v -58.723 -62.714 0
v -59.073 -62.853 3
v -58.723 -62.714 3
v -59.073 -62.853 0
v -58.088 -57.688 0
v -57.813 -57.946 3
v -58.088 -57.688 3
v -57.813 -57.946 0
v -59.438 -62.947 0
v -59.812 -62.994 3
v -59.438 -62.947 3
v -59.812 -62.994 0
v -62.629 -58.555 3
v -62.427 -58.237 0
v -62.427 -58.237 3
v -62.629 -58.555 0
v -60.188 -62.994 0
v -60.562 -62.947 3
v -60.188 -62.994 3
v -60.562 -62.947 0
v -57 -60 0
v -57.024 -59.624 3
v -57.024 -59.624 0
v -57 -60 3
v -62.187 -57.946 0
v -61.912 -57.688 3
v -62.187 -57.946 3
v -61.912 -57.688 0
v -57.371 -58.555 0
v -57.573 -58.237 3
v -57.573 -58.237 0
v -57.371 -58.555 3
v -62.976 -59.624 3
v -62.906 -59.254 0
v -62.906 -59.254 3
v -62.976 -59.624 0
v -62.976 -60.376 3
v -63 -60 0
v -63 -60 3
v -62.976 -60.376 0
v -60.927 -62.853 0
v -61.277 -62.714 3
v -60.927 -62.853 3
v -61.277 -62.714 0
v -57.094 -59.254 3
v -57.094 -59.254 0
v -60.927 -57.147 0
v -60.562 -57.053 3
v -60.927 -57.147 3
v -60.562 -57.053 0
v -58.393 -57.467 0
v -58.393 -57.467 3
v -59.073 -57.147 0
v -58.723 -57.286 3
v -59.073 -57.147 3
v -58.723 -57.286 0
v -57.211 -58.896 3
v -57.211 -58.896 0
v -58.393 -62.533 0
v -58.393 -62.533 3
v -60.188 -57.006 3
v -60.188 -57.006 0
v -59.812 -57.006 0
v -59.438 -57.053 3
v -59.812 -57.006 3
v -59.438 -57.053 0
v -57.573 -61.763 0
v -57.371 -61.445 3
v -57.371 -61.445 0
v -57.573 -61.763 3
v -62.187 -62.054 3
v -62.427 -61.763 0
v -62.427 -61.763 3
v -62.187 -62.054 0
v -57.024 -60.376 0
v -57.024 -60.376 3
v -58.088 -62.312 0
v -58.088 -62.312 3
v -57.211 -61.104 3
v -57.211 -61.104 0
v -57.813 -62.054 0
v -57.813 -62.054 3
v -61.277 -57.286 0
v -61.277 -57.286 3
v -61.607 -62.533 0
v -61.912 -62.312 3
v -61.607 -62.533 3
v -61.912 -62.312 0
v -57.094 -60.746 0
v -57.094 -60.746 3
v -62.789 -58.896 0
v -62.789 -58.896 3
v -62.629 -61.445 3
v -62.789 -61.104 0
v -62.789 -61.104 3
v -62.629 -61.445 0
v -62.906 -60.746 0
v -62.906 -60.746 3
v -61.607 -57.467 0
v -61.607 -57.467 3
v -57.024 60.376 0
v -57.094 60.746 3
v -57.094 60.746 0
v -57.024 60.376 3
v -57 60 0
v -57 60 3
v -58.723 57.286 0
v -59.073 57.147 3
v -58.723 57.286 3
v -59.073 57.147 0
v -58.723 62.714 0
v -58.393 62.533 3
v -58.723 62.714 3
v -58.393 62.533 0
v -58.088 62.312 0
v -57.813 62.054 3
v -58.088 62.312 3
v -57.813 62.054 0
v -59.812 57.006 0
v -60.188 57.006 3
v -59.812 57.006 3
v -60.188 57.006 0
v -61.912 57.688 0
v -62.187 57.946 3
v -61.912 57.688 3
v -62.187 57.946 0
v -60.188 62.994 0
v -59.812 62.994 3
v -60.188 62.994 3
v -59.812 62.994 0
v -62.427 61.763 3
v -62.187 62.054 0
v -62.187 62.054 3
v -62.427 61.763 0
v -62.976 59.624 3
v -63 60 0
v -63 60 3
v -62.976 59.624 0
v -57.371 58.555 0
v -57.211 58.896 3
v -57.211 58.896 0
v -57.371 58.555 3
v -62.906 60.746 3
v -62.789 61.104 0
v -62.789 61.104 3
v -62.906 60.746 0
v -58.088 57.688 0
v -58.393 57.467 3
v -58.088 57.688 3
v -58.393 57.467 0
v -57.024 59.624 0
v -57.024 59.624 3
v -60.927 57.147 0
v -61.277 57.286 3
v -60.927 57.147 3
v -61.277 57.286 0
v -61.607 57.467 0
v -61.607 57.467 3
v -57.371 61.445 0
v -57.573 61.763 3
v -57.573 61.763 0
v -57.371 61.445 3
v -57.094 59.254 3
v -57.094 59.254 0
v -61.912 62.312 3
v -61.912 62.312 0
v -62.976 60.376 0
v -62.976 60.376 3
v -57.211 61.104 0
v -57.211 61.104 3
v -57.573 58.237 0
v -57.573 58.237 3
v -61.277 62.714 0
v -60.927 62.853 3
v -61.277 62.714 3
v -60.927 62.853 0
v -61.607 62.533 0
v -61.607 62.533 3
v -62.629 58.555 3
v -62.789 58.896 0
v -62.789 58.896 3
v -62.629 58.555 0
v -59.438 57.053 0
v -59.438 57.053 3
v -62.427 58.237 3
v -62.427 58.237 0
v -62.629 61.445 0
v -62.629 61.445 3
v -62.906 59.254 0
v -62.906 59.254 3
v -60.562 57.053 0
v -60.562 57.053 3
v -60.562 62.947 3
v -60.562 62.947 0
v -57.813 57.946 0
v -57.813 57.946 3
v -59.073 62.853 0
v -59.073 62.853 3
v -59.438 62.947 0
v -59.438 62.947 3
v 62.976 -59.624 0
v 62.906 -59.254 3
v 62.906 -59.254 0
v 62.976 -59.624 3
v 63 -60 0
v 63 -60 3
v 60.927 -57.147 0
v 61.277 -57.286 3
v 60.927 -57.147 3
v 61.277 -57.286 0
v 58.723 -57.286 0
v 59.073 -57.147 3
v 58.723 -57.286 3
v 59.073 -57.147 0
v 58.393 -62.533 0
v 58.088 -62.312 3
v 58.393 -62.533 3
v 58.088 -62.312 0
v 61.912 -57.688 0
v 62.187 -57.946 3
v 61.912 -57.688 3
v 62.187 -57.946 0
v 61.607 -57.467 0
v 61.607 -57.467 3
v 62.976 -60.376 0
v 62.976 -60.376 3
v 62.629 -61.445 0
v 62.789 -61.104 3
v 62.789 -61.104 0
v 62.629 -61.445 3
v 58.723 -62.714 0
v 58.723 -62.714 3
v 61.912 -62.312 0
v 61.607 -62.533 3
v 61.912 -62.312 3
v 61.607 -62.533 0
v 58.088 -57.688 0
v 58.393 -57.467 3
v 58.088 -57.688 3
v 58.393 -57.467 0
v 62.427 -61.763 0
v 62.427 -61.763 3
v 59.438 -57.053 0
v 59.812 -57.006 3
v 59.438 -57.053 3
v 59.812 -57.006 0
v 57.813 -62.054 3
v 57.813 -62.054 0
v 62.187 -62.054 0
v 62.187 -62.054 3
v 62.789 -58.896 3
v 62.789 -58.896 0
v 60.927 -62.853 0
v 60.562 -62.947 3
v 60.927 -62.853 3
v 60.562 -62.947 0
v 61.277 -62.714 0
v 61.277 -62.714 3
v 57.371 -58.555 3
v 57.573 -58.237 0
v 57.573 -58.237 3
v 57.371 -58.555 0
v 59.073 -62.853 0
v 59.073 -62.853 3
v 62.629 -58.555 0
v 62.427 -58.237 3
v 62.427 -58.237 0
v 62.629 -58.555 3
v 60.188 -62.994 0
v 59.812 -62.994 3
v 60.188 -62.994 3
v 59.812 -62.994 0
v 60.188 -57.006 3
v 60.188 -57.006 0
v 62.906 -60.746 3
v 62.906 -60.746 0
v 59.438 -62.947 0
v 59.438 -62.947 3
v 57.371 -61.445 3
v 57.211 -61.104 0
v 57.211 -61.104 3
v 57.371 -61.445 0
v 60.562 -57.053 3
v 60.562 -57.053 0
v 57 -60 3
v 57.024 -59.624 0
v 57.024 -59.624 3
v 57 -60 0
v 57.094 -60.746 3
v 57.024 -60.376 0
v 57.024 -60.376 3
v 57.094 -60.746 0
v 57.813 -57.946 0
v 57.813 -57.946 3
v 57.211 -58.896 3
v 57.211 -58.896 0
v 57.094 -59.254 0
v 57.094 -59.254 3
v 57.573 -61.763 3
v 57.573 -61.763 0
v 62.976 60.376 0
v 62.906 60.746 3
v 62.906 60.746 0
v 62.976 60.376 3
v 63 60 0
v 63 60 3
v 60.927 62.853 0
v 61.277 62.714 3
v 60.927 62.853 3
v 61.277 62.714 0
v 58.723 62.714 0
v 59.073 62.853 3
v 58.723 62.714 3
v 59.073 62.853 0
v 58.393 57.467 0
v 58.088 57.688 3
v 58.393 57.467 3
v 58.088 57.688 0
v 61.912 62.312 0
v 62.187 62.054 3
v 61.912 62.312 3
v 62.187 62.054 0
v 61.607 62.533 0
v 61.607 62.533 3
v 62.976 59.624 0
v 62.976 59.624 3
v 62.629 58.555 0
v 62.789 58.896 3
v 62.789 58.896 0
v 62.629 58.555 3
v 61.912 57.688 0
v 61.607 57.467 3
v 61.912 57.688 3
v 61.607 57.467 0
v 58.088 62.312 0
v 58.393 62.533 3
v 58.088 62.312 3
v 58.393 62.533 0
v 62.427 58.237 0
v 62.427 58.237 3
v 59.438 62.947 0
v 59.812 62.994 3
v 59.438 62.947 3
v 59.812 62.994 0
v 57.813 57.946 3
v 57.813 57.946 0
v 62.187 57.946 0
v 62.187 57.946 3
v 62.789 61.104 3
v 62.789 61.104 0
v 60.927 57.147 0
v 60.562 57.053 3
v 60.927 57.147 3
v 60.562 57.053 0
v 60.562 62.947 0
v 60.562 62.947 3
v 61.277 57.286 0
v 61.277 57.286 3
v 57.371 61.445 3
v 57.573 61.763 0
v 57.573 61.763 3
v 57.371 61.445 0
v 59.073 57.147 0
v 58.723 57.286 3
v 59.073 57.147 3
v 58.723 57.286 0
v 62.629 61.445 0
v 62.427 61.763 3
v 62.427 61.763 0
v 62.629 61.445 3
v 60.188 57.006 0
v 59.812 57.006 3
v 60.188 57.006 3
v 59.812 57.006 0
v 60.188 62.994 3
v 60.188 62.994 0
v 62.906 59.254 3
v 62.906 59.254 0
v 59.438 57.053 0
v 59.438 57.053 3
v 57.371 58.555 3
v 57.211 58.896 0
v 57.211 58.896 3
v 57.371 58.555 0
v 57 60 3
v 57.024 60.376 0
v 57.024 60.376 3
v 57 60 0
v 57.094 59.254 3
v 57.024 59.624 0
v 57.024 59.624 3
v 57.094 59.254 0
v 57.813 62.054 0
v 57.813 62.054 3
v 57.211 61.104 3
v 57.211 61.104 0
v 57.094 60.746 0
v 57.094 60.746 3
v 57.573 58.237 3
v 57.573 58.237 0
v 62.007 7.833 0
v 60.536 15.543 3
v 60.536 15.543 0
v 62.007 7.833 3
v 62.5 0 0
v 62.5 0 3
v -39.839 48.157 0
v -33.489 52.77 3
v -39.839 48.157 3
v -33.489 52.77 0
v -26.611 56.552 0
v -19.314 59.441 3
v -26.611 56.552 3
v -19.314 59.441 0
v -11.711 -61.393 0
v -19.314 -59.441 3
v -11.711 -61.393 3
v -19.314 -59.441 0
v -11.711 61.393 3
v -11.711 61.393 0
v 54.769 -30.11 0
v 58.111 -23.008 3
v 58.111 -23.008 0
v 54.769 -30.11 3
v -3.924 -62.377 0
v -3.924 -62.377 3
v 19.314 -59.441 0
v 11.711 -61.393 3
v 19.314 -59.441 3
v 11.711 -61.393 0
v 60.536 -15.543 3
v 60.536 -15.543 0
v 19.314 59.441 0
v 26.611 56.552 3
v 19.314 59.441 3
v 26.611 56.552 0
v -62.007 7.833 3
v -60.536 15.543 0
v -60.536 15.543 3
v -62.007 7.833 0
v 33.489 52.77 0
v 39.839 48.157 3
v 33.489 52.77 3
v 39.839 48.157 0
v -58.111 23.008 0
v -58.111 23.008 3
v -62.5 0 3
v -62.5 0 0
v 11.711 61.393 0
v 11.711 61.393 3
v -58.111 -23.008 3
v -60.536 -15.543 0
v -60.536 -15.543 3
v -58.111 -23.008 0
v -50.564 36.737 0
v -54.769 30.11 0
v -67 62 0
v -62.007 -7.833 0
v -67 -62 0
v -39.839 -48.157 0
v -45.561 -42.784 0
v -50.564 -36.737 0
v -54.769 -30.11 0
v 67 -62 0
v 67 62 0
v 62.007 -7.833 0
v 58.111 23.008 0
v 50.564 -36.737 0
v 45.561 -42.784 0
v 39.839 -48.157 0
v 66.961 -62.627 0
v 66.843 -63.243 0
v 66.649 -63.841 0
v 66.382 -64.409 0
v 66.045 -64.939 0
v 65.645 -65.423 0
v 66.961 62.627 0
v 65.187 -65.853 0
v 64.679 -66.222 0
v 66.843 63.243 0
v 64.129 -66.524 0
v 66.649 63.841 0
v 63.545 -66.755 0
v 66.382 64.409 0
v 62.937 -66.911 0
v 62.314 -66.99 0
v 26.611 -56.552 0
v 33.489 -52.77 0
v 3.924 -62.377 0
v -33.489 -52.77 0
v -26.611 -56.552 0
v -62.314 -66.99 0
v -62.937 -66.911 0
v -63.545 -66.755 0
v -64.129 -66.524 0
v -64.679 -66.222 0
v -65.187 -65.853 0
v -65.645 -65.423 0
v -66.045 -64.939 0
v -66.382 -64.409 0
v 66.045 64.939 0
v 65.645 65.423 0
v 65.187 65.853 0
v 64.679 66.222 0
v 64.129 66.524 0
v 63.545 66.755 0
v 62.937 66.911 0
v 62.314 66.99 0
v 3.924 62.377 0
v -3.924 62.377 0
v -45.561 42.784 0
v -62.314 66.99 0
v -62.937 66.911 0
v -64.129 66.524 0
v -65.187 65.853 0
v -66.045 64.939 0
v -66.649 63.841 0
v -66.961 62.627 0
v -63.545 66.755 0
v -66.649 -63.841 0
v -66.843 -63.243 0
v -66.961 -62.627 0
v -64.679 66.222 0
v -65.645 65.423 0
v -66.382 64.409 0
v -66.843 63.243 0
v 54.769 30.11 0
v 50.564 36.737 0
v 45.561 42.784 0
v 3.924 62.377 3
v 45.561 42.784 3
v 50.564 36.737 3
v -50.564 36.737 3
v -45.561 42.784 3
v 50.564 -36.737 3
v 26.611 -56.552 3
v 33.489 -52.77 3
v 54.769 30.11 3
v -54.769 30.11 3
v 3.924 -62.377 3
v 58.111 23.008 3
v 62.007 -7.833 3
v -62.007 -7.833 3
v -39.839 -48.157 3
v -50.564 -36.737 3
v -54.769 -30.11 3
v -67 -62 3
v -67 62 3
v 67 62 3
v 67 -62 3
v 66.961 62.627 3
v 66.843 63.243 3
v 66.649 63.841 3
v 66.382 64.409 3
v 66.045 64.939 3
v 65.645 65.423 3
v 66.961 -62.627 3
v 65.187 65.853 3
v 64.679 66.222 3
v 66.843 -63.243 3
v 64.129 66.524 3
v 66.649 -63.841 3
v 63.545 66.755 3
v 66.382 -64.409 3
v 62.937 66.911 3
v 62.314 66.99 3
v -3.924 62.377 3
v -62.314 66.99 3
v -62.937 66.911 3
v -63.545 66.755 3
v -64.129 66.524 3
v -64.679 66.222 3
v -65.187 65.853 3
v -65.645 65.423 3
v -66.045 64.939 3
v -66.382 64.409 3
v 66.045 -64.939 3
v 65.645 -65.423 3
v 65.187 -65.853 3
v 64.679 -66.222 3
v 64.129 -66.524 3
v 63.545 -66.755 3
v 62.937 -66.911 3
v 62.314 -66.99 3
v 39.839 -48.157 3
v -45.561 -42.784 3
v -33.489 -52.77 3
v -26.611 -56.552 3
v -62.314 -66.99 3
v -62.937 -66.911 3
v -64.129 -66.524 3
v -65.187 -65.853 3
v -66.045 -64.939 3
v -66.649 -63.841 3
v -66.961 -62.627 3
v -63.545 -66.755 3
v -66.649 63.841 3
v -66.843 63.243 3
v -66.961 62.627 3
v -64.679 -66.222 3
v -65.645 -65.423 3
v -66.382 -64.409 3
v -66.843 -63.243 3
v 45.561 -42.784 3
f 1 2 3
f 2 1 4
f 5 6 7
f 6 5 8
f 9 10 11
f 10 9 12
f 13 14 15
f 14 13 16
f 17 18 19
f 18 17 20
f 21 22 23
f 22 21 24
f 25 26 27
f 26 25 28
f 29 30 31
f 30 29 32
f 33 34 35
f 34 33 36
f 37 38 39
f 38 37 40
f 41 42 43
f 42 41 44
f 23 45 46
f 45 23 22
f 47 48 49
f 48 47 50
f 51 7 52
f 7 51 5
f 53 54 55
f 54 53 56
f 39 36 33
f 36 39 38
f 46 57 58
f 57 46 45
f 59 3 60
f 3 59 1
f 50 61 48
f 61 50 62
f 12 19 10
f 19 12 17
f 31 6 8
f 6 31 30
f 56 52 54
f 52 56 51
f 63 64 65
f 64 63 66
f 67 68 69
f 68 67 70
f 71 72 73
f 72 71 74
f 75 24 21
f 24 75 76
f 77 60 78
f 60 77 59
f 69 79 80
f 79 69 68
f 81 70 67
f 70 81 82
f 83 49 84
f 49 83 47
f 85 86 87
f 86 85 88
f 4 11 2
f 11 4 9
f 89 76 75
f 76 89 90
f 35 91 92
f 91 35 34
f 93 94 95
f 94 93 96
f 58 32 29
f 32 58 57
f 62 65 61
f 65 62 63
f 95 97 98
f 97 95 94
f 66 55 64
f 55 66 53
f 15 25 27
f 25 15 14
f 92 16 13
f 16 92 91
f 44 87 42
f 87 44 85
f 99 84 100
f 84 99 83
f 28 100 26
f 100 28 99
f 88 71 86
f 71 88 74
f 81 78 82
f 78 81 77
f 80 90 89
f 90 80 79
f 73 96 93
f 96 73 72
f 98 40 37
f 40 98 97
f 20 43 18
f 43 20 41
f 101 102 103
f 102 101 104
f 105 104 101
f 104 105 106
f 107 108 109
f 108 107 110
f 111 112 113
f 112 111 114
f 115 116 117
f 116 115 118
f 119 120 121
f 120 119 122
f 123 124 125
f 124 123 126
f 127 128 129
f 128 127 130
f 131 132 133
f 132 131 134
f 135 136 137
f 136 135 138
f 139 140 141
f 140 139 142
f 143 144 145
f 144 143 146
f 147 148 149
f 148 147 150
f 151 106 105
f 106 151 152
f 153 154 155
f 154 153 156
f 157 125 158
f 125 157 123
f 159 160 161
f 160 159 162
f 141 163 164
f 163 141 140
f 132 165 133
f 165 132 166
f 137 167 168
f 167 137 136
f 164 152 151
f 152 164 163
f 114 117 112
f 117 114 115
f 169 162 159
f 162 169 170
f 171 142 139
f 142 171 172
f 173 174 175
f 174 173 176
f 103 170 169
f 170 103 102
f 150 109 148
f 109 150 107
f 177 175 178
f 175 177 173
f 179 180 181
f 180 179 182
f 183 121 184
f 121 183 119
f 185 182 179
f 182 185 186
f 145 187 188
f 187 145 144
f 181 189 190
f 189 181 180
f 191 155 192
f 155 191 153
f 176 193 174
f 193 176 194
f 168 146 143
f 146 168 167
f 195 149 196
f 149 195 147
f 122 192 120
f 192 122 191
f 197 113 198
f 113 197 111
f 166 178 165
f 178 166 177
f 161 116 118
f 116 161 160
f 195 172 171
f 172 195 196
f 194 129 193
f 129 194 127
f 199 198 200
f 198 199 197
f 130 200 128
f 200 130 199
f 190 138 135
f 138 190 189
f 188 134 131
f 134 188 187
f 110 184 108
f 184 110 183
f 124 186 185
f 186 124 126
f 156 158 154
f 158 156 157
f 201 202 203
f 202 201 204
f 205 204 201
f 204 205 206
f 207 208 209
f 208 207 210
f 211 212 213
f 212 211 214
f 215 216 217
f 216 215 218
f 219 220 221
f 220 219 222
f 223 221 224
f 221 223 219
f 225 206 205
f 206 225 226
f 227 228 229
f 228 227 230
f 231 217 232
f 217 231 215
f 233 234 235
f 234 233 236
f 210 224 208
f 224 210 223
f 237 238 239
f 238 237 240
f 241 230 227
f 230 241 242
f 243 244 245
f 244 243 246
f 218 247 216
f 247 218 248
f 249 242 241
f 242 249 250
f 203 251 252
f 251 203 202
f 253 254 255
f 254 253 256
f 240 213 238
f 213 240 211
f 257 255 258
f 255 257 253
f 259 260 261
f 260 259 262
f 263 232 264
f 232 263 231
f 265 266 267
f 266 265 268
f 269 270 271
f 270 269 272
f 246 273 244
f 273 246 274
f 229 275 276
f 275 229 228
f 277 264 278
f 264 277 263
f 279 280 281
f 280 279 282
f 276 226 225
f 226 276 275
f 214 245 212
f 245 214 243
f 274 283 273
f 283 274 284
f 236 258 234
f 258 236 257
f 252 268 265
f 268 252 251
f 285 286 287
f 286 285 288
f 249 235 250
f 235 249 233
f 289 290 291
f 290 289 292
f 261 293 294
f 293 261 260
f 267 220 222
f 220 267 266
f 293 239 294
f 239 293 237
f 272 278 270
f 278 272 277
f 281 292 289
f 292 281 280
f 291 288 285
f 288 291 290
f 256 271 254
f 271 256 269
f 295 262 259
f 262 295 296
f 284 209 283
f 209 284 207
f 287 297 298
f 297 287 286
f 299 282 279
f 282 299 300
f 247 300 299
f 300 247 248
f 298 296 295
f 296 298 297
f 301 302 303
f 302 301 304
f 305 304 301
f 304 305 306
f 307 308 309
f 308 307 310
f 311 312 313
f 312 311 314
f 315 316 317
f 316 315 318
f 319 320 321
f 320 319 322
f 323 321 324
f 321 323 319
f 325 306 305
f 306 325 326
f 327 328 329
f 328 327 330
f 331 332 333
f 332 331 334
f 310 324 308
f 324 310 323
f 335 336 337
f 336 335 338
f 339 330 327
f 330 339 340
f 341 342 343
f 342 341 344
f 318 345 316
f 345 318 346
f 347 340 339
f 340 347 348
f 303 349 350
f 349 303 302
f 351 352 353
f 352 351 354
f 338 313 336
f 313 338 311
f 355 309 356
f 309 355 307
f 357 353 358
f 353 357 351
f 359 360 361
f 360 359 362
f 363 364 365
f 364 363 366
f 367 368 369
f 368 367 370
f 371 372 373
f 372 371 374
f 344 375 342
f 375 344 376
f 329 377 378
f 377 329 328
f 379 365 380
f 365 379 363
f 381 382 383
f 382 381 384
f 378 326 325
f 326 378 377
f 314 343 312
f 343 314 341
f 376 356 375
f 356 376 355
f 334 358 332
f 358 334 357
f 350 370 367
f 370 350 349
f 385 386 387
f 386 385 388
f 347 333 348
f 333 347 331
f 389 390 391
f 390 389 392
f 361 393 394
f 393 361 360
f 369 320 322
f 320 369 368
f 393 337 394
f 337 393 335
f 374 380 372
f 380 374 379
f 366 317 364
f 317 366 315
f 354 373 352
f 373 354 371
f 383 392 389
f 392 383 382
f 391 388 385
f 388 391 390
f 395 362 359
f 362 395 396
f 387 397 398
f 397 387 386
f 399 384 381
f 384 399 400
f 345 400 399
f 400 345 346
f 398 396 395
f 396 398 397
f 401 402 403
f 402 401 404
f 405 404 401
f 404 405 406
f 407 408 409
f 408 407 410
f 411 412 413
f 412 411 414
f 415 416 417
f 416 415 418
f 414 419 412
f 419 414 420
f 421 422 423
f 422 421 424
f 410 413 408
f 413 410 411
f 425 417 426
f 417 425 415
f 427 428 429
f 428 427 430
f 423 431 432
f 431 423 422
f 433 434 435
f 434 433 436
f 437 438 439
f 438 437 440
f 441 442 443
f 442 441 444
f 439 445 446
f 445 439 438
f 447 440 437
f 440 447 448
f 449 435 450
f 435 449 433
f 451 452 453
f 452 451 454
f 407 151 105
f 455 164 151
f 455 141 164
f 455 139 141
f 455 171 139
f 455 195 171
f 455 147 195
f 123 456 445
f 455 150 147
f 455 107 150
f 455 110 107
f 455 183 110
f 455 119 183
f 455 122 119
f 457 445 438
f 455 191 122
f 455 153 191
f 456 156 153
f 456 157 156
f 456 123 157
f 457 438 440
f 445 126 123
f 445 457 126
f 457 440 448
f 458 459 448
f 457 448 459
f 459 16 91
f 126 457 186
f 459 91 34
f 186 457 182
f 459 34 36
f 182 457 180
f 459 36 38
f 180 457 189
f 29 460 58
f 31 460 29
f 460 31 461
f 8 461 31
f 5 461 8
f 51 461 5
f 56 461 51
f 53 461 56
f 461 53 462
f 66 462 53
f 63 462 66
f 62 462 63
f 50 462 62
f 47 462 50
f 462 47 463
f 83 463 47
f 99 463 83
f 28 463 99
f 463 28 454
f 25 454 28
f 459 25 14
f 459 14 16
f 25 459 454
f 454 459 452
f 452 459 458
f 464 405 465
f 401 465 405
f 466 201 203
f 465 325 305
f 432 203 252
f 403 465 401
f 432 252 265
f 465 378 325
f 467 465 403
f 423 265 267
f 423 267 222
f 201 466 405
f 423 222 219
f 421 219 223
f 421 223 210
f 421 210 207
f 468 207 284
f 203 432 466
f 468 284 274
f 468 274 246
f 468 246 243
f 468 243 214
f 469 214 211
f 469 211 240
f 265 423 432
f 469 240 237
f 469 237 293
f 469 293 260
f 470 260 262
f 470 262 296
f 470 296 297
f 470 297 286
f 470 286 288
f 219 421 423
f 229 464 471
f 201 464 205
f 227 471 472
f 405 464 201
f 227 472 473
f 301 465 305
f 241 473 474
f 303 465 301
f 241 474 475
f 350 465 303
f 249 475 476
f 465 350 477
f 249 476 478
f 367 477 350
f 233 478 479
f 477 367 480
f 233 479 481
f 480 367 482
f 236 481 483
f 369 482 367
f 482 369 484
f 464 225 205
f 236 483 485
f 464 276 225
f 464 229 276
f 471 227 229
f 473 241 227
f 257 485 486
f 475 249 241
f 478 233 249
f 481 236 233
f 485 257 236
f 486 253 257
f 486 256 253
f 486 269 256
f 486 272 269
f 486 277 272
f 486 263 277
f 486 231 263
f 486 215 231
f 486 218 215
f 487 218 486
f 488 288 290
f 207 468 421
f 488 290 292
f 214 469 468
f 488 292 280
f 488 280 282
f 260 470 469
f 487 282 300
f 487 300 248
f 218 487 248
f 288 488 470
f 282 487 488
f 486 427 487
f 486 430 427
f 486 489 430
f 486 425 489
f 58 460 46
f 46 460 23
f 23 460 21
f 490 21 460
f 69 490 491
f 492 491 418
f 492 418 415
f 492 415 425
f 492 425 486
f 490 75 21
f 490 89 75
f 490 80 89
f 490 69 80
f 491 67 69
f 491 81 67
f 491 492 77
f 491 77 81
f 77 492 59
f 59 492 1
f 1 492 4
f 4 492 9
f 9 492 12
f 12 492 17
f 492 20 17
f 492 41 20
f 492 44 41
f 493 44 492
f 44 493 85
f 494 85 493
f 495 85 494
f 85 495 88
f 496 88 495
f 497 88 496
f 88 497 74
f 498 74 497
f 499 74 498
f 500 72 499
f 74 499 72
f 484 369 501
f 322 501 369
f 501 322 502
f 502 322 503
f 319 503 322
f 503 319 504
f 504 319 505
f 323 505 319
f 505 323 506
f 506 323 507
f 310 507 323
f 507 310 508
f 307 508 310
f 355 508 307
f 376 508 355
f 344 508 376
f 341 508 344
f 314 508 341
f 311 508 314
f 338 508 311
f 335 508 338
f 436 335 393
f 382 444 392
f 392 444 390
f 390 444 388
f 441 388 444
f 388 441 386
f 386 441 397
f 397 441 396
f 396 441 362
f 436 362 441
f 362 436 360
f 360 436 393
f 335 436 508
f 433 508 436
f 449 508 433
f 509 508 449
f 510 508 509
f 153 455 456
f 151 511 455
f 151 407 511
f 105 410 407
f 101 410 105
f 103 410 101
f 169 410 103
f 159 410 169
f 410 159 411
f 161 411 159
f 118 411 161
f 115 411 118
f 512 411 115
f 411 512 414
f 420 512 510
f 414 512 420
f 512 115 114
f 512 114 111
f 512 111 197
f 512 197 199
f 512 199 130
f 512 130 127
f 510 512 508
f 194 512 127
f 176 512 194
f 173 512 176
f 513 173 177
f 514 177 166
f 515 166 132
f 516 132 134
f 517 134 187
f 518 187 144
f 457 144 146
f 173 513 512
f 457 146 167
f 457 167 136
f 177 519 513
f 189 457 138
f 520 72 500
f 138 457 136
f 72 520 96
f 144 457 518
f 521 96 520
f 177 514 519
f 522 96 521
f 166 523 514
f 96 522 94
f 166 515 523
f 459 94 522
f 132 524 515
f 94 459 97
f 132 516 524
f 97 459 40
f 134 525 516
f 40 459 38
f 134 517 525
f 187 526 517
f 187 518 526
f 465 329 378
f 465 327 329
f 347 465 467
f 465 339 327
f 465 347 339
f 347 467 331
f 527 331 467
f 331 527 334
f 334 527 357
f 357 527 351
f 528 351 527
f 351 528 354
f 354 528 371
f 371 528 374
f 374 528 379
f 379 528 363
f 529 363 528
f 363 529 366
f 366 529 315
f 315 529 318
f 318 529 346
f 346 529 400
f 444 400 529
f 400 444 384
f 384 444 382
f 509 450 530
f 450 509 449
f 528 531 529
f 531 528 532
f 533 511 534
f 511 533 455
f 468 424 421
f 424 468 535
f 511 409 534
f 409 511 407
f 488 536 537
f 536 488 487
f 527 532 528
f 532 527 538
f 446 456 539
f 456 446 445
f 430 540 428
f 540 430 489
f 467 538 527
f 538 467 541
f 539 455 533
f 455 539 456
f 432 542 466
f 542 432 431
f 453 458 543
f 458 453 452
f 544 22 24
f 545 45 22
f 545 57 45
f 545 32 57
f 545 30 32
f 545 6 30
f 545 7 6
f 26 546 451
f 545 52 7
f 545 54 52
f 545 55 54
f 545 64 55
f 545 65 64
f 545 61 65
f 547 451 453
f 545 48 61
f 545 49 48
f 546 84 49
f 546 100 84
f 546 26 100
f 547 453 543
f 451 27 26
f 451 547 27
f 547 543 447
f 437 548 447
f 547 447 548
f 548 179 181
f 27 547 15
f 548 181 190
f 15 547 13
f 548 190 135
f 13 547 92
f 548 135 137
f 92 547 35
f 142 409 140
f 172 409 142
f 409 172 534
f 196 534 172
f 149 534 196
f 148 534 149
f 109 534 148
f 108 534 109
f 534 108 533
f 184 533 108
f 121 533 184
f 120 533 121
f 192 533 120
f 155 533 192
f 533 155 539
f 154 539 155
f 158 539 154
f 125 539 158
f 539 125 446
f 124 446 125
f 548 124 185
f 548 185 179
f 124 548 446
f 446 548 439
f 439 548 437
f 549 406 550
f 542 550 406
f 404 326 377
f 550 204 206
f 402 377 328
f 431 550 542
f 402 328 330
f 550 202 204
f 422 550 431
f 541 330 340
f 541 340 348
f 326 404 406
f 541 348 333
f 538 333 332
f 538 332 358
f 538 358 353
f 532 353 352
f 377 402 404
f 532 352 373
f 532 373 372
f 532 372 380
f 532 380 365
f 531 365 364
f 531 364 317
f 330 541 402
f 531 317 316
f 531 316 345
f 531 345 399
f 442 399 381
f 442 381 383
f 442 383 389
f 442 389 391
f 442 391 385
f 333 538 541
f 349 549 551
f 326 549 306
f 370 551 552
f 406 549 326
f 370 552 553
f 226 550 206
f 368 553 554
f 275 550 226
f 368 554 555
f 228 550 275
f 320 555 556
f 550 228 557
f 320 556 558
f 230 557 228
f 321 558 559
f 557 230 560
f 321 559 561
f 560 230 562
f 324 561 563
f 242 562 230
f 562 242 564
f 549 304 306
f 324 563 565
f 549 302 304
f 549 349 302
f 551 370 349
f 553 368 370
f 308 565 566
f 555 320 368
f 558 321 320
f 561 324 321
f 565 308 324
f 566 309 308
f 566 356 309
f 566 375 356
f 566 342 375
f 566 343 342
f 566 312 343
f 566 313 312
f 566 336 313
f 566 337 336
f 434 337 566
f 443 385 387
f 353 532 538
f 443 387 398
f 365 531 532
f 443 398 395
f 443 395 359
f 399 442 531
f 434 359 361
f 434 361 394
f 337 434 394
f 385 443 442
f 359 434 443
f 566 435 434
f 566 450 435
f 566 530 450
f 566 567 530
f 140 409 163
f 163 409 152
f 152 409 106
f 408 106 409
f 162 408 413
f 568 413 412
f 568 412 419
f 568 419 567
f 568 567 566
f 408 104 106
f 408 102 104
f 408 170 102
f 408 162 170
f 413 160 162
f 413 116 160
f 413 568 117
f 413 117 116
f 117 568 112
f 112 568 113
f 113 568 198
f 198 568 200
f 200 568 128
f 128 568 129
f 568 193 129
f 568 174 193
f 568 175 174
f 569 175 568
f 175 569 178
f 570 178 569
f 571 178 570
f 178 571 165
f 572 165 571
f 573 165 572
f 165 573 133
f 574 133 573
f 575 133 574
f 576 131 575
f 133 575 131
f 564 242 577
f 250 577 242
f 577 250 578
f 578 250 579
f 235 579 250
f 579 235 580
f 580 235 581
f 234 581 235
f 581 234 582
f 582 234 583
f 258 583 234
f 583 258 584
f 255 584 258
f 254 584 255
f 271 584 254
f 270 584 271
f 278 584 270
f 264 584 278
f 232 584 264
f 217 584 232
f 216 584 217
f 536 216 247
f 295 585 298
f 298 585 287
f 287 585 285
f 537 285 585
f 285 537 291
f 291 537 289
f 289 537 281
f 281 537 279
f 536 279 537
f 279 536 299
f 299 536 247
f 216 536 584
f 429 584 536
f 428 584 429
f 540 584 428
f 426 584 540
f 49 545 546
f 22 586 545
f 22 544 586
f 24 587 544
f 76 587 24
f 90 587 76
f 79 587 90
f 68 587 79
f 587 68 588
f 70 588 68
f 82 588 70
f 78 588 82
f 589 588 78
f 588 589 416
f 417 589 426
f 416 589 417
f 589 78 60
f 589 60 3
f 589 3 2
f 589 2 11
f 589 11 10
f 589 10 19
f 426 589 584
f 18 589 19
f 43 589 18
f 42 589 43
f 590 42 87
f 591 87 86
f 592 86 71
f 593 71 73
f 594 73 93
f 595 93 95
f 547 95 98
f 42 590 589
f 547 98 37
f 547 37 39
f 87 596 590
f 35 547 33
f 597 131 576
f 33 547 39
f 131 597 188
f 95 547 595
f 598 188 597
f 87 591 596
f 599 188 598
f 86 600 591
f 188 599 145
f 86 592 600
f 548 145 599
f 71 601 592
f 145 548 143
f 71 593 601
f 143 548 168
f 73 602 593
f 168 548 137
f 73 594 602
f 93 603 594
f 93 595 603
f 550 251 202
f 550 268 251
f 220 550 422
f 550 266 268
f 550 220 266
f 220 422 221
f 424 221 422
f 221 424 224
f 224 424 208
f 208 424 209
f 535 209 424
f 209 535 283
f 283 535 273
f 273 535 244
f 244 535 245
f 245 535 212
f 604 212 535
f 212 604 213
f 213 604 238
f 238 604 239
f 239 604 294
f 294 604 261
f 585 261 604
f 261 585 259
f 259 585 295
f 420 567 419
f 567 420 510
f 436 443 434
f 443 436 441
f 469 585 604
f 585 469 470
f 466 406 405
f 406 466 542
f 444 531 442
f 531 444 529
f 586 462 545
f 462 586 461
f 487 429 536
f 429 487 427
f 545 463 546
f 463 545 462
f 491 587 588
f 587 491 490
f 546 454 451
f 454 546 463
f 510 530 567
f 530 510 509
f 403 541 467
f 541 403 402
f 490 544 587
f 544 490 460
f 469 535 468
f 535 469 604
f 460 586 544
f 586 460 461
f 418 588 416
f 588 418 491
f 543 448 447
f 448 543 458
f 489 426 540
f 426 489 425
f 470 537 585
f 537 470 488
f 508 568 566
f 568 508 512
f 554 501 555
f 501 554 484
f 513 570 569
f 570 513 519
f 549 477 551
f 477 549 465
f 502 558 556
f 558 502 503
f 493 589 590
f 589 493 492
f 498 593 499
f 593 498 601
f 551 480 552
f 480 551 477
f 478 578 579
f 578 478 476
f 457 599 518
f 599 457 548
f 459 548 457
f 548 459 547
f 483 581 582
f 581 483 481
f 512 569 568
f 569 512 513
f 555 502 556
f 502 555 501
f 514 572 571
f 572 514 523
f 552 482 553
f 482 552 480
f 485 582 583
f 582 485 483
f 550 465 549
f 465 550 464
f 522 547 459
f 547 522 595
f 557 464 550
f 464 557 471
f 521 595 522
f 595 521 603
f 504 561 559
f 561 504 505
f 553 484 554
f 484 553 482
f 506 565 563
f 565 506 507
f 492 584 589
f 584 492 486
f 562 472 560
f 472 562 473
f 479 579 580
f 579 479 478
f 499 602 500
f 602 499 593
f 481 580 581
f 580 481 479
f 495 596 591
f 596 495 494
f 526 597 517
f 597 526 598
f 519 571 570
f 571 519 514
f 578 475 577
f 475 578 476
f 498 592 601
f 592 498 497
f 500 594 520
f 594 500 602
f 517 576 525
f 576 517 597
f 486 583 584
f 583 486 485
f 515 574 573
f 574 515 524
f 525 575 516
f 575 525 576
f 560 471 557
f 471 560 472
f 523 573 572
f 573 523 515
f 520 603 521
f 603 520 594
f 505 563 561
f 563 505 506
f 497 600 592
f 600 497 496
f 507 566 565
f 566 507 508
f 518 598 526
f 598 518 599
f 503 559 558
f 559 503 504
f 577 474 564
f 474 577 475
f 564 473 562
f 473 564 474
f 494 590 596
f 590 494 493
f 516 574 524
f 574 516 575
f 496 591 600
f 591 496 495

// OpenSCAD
$fn = 50;


difference() {
	union() {
		hull() {
			translate(v = [-62.0000000000, 62.0000000000, 0]) {
				cylinder(h = 3, r = 5);
			}
			translate(v = [62.0000000000, 62.0000000000, 0]) {
				cylinder(h = 3, r = 5);
			}
			translate(v = [-62.0000000000, -62.0000000000, 0]) {
				cylinder(h = 3, r = 5);
			}
			translate(v = [62.0000000000, -62.0000000000, 0]) {
				cylinder(h = 3, r = 5);
			}
		}
	}
	union() {
		#translate(v = [-60.0000000000, -60.0000000000, -100.0000000000]) {
			cylinder(h = 200, r = 3.0000000000);
		}
		#translate(v = [-60.0000000000, 60.0000000000, -100.0000000000]) {
			cylinder(h = 200, r = 3.0000000000);
		}
		#translate(v = [60.0000000000, -60.0000000000, -100.0000000000]) {
			cylinder(h = 200, r = 3.0000000000);
		}
		#translate(v = [60.0000000000, 60.0000000000, -100.0000000000]) {
			cylinder(h = 200, r = 3.0000000000);
		}
		#cylinder(h = 3, r = 62.5000000000);
	}
}
